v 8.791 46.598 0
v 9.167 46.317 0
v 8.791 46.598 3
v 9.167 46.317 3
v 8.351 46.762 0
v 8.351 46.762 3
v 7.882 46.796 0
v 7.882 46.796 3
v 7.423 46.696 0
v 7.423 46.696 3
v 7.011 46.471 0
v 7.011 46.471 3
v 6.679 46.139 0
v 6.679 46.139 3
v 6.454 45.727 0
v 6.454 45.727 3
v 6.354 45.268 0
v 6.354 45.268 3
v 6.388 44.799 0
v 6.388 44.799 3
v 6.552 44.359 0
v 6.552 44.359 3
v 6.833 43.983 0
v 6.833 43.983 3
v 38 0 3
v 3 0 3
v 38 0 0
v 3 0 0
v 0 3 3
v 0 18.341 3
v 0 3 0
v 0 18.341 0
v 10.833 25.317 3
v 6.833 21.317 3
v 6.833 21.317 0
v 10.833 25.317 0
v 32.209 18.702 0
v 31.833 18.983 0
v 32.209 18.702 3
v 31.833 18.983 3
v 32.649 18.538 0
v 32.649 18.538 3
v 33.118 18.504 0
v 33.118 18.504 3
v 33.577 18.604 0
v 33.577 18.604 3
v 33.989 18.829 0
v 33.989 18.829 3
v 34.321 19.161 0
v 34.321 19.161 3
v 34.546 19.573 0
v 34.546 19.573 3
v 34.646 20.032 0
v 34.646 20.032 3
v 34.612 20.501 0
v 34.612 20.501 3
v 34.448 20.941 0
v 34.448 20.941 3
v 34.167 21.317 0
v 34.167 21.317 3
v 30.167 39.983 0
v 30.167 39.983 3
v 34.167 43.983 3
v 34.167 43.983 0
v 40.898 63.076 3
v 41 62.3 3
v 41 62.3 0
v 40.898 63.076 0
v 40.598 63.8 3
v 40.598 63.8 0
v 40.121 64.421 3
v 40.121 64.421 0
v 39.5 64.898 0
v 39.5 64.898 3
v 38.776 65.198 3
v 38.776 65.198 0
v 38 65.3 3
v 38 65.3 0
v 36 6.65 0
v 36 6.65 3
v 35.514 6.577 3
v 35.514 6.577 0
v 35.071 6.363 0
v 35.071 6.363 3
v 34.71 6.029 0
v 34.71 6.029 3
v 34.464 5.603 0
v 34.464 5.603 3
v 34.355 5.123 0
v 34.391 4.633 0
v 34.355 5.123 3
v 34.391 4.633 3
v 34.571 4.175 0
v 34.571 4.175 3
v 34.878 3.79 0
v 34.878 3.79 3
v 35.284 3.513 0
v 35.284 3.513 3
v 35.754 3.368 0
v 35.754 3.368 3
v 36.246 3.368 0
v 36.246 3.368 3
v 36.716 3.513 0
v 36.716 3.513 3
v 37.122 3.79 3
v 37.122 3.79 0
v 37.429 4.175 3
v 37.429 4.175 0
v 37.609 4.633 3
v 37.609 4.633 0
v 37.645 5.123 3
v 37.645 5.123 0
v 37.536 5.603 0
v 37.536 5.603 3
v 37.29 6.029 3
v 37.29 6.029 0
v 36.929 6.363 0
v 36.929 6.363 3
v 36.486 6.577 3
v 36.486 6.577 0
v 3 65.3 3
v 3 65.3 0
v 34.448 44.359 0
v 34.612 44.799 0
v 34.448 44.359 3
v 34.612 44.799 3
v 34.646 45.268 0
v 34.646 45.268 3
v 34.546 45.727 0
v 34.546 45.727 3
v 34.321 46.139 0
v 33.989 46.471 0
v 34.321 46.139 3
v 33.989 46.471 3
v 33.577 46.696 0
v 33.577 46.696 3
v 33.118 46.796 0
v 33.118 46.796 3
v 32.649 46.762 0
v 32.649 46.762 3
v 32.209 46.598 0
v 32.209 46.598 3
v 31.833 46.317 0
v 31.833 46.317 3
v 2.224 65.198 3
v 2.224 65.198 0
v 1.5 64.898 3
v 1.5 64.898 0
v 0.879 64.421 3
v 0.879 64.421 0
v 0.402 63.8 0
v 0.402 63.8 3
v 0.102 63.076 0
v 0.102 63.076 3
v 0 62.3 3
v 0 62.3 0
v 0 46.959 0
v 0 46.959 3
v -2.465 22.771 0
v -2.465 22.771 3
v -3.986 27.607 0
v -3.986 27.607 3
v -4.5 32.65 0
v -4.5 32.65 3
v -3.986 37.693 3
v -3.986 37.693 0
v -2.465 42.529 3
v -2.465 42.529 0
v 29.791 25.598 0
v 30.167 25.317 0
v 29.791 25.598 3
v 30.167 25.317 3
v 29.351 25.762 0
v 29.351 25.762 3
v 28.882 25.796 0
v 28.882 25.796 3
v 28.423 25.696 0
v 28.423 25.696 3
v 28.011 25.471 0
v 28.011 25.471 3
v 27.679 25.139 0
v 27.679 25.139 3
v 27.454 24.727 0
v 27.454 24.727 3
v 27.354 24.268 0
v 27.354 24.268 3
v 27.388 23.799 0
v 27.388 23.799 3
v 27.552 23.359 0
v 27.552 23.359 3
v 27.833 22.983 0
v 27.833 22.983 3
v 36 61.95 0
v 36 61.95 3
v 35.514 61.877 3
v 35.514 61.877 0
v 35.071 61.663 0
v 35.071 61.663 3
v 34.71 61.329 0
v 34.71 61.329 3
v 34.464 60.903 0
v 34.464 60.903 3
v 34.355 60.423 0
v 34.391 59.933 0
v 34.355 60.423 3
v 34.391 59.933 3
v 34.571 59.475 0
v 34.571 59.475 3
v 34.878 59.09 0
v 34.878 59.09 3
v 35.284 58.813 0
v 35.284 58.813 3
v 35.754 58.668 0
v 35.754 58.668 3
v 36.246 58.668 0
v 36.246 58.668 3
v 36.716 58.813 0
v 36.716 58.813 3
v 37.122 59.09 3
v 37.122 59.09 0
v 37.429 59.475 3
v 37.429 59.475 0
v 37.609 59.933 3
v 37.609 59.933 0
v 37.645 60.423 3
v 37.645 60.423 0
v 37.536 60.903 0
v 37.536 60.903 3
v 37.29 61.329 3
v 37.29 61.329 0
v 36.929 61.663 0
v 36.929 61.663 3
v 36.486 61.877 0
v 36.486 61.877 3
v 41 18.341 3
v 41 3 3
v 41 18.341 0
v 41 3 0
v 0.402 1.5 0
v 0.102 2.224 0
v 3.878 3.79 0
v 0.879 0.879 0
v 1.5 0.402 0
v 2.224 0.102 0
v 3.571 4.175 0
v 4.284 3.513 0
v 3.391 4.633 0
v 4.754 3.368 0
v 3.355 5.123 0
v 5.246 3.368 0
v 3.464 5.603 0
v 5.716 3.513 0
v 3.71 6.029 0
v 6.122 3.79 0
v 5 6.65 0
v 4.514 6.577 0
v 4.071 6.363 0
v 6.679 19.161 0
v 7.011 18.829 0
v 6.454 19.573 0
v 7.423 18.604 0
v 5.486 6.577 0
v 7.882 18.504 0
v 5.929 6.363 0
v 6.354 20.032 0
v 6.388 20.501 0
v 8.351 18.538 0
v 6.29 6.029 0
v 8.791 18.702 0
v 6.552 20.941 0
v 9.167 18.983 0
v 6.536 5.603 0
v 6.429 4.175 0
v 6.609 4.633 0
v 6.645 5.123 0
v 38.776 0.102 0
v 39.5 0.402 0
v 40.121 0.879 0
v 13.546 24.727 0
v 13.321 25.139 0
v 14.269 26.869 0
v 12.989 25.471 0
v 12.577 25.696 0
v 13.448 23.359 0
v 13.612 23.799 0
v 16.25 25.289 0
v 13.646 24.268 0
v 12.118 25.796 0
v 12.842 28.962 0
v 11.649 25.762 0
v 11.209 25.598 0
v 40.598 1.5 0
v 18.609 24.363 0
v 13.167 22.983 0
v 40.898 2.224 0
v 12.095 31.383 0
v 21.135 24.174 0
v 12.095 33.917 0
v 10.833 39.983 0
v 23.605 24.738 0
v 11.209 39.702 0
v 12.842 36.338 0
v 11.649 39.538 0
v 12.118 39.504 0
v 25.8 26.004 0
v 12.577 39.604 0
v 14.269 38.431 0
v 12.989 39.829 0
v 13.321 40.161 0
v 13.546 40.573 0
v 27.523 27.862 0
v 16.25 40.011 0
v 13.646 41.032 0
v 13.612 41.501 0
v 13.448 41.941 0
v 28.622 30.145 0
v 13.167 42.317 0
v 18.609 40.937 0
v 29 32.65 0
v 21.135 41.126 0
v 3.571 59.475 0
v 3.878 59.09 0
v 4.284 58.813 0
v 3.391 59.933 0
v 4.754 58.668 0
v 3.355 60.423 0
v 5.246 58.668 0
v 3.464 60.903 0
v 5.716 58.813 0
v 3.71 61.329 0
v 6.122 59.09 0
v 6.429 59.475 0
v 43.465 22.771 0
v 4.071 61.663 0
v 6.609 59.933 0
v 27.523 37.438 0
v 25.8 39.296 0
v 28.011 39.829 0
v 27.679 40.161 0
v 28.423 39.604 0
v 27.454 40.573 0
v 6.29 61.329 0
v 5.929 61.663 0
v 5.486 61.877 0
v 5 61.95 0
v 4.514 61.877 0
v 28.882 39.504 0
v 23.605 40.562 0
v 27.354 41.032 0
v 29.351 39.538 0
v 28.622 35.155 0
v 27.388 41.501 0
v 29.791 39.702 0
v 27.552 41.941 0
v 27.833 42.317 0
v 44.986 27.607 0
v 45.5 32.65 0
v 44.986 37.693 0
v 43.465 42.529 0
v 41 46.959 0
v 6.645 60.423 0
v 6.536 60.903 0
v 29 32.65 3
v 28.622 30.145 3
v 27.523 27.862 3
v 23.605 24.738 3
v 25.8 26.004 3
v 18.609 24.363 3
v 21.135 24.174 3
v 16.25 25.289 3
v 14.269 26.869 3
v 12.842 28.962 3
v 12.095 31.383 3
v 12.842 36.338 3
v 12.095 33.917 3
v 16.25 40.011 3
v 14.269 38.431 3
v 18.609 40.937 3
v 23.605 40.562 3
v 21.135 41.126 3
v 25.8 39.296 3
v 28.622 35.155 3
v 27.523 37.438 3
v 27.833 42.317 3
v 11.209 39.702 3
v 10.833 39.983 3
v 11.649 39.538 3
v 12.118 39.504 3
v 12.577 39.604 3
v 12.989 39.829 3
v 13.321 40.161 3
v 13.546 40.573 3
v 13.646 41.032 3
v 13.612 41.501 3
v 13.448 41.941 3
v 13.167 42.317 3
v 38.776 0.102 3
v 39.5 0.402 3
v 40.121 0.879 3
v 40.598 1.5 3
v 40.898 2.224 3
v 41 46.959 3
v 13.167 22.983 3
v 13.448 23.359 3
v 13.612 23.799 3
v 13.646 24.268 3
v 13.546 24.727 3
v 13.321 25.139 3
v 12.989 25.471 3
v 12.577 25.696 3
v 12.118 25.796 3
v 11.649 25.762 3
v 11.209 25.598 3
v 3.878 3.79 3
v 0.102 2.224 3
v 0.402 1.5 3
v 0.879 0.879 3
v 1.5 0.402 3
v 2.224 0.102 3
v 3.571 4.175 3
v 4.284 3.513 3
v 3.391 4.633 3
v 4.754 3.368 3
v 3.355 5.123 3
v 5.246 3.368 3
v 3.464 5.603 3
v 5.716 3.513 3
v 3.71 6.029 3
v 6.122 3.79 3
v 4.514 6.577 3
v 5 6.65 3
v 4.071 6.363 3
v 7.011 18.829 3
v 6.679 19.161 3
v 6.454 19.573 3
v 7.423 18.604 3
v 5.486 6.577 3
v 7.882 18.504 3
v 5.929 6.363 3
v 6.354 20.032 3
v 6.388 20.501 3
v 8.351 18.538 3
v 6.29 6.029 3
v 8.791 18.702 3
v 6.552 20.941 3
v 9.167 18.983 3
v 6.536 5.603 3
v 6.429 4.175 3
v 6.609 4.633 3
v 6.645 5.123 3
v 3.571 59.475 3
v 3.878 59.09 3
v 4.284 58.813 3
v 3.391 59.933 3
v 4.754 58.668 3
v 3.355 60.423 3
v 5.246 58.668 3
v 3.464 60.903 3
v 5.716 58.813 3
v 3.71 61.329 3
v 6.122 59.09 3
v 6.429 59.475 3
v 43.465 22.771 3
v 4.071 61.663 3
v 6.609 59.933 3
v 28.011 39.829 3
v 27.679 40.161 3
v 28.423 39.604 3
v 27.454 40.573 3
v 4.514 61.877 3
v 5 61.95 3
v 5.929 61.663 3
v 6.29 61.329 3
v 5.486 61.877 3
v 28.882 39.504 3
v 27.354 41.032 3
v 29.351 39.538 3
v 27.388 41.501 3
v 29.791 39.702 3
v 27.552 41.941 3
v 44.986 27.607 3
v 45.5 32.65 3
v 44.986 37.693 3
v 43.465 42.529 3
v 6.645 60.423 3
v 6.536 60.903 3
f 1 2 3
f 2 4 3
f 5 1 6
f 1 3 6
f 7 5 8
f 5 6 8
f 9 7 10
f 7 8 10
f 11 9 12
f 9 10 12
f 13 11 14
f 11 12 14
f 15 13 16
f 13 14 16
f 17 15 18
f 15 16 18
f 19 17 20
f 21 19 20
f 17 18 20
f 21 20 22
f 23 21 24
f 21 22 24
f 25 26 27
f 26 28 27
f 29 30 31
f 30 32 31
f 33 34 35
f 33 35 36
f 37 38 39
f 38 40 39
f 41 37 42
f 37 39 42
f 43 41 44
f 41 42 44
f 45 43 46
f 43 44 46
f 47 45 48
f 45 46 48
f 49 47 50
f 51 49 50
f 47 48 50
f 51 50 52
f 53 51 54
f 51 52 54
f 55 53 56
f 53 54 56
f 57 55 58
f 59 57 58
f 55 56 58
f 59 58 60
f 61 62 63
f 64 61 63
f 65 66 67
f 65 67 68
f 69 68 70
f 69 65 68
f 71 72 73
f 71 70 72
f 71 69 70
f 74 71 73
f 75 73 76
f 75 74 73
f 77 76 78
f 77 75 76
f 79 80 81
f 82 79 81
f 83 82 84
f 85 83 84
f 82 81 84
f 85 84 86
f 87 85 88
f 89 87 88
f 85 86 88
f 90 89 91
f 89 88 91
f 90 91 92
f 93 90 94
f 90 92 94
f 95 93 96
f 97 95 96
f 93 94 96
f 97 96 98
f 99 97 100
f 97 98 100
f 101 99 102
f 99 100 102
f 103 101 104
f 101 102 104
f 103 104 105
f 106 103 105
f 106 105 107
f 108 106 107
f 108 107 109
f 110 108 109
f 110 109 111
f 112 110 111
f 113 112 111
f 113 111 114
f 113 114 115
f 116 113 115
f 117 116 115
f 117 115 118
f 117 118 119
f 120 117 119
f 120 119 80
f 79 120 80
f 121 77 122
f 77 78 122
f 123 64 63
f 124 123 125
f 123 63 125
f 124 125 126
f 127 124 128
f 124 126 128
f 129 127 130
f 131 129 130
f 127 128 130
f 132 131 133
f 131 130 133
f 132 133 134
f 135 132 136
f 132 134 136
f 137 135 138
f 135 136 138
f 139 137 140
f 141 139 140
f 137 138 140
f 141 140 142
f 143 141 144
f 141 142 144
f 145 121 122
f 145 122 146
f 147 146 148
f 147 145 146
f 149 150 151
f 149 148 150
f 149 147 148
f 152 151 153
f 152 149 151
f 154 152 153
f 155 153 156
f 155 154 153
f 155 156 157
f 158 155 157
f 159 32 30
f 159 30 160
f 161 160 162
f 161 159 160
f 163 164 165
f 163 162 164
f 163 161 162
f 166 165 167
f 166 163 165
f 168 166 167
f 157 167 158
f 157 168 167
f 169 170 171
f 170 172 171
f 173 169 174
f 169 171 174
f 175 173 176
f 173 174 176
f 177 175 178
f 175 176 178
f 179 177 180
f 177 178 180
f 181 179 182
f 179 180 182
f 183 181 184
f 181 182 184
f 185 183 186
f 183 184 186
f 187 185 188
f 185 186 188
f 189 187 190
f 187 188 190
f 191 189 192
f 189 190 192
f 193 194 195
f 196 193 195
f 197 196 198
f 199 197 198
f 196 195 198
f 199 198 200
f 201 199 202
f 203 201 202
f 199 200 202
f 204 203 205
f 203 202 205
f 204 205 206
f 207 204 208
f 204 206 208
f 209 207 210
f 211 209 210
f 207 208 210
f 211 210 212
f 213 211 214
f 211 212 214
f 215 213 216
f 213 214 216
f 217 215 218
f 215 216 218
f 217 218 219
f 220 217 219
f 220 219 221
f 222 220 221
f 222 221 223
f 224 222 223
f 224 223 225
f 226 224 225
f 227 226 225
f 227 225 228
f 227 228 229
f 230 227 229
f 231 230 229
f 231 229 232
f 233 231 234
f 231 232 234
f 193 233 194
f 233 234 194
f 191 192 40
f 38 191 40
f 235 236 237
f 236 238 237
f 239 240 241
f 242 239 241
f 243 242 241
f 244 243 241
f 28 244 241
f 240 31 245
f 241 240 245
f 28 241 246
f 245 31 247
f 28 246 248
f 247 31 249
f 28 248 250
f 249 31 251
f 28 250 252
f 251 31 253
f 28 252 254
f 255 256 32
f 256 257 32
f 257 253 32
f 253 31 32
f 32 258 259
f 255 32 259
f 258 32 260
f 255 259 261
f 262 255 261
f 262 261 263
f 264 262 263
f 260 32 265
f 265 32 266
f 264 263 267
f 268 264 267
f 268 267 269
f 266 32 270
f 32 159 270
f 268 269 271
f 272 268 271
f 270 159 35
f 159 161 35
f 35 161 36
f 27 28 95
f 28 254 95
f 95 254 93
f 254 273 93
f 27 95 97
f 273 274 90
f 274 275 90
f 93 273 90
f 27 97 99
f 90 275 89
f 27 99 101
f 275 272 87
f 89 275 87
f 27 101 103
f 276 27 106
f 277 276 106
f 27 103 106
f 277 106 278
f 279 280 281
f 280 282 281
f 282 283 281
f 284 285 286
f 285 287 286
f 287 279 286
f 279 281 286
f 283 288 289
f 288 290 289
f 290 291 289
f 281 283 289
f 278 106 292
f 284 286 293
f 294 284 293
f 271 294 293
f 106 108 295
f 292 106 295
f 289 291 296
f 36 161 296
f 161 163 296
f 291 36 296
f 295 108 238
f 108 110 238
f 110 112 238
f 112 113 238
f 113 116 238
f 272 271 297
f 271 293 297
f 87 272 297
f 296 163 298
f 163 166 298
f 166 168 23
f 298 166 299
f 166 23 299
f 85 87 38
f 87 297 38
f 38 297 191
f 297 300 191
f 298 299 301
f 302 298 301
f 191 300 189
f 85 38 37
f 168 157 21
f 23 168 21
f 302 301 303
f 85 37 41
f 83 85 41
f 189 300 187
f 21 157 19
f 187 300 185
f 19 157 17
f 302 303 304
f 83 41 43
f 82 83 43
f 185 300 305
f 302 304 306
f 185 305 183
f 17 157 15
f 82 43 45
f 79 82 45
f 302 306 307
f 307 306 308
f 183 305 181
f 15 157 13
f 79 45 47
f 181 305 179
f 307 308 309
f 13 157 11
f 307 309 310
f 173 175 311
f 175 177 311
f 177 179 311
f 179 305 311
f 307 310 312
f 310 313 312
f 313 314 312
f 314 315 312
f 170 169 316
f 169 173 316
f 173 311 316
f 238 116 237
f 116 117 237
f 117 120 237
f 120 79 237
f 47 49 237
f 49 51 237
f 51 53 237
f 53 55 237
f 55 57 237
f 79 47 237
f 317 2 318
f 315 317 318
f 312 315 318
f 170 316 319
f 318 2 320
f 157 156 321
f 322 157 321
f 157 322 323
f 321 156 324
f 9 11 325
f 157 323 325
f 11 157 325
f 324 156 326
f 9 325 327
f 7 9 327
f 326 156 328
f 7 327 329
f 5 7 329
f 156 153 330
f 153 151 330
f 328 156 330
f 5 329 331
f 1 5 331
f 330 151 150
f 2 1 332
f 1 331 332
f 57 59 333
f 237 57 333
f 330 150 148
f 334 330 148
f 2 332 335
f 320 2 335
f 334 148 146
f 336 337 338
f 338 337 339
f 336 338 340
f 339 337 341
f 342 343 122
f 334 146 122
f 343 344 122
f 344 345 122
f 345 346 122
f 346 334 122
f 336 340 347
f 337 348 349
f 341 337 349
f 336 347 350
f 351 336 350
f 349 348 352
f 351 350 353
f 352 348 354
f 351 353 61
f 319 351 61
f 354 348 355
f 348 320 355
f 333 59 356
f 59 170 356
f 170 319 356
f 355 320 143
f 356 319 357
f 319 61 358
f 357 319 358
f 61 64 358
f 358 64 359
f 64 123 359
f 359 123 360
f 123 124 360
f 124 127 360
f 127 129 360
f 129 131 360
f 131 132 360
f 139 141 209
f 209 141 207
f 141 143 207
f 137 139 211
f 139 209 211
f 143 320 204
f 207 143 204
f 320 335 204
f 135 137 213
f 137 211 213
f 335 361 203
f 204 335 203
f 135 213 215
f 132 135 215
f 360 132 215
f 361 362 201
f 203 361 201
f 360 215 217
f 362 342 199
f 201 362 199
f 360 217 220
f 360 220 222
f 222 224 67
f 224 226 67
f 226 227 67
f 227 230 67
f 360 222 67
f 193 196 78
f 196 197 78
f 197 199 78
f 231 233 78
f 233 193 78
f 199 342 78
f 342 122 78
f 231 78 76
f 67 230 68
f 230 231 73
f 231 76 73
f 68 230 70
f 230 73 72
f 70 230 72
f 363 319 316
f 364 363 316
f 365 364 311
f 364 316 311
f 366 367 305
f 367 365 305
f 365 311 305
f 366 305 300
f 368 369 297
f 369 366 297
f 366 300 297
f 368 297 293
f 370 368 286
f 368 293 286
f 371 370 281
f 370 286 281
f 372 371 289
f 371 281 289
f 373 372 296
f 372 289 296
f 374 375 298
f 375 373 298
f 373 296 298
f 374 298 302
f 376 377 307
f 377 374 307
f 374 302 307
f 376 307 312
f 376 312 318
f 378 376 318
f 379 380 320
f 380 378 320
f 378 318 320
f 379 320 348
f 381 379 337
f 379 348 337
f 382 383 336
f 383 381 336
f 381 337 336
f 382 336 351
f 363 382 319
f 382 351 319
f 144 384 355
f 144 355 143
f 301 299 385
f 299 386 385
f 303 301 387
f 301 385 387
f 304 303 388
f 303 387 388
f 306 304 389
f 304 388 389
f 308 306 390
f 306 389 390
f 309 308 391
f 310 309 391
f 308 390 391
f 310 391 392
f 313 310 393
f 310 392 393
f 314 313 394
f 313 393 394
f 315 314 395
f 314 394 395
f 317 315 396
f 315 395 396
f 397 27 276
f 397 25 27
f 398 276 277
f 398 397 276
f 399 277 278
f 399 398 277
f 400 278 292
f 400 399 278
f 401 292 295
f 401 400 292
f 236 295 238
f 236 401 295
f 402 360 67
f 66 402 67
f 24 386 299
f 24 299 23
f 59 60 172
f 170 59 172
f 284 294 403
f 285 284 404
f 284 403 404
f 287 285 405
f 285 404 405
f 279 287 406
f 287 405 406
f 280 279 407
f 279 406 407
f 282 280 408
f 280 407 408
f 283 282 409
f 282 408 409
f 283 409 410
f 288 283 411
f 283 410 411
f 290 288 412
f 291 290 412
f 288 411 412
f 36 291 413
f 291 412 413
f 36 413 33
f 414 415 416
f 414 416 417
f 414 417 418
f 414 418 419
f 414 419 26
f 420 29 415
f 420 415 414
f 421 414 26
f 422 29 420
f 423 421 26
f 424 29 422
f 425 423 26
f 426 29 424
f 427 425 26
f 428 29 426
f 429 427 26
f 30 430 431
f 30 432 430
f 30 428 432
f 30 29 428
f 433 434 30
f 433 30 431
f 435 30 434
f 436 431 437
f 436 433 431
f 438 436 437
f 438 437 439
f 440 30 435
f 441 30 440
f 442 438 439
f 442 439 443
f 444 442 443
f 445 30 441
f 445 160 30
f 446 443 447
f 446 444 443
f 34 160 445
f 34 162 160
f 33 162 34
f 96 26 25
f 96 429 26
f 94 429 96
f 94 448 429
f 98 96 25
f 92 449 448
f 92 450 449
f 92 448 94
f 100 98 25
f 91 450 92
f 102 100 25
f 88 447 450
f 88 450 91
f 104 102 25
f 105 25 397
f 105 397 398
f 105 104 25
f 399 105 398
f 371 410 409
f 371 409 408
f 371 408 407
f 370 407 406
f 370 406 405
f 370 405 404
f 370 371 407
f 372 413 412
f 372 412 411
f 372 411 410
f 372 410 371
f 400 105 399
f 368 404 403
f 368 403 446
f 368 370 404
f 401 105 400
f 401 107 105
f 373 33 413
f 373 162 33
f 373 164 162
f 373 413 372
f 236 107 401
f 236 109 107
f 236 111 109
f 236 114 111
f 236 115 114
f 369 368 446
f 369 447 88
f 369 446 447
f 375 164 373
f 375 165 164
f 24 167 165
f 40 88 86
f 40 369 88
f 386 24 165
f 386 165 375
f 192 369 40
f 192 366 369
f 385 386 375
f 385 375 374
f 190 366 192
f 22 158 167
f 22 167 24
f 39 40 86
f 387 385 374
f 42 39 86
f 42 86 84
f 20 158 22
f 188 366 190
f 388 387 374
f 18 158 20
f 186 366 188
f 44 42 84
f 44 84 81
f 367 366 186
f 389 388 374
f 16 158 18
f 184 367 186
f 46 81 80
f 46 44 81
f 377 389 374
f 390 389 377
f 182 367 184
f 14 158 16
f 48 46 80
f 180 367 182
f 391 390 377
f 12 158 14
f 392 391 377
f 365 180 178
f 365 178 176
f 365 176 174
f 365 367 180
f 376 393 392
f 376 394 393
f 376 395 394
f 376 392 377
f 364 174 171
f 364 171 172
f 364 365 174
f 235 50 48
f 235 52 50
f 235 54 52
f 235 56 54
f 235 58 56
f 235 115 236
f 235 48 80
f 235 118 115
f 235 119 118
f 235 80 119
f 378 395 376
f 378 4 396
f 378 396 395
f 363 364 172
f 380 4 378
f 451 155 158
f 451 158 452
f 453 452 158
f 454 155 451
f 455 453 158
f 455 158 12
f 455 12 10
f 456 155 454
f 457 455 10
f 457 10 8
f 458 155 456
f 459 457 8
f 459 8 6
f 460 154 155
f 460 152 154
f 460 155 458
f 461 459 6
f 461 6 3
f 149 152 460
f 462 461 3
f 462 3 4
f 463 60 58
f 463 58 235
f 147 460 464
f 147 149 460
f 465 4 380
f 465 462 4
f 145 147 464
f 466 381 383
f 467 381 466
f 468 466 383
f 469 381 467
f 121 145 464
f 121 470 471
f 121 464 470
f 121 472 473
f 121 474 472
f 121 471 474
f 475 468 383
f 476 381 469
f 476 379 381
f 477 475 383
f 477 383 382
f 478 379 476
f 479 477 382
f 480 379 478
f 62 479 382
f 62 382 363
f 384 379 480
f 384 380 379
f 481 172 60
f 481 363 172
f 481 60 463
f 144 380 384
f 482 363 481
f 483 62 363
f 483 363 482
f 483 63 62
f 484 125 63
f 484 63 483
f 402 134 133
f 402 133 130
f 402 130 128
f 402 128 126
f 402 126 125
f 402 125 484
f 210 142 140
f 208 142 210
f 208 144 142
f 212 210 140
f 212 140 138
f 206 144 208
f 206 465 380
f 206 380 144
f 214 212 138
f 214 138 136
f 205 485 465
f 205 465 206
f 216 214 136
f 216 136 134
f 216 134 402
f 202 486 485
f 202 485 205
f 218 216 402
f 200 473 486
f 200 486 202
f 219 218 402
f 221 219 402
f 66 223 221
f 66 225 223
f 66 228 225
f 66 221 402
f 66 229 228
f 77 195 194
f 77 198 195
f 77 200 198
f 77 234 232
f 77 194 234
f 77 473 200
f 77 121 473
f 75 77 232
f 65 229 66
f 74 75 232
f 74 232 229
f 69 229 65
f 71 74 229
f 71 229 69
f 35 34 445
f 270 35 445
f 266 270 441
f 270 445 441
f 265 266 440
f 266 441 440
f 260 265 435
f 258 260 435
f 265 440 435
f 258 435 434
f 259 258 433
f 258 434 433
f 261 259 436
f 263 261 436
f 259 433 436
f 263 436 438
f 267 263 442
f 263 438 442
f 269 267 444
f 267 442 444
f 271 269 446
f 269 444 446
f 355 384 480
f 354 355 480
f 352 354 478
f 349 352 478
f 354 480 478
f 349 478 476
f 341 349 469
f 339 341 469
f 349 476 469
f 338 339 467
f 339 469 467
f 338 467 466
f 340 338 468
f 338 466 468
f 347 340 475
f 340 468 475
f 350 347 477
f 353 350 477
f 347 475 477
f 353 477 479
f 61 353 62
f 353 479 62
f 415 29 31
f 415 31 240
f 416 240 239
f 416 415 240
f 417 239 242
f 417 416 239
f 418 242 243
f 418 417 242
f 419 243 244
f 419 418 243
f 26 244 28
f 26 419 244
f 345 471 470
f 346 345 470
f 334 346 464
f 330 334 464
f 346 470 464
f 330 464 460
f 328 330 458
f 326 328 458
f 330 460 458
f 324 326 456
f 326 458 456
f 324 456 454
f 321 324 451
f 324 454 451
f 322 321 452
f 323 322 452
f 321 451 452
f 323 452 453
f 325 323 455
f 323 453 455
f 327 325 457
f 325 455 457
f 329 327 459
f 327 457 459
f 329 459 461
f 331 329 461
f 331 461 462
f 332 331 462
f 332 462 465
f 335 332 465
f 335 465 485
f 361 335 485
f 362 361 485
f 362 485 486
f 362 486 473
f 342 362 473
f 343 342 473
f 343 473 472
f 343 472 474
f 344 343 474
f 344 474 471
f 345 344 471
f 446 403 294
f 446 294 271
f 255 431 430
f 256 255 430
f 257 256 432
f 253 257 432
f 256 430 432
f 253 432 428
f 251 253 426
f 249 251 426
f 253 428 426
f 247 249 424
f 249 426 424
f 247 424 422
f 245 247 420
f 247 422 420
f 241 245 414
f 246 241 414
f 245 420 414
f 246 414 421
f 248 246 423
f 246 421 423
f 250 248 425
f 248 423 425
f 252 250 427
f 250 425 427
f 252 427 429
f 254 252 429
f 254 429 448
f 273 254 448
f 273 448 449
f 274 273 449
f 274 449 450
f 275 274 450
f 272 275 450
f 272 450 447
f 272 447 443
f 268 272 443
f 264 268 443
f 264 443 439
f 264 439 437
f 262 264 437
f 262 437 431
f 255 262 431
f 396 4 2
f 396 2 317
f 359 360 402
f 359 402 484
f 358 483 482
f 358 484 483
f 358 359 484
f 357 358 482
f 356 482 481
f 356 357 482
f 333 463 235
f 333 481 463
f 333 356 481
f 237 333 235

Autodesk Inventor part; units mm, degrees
ref_plane "YZ Plane" through (0, 0, 0) normal (1, 0, 0) x (0, 1, 0)
ref_plane "XZ Plane" through (0, 0, 0) normal (0, 1, 0) x (-1, 0, 0)
ref_plane "XY Plane" through (0, 0, 0) normal (0, 0, 1) x (1, 0, 0)
sketch "Sketch1" plane through (0, 0, 0) normal (0, 0, 1) x (1, 0, 0)
  line L0 (0, 0) -> (41, 0) construction
  line L1 (41, 0) -> (41, 65.3) construction
  line L2 (41, 65.3) -> (0, 65.3) construction
  circle A0 centre (20.5, 32.65) radius 8.5
  line L3 (0, 0) -> (41, 0)
  line L4 (41, 65.3) -> (0, 65.3)
  line L5 (20.5, 65.3) -> (20.5, 0) construction
  line L6 (0, 32.65) -> (41, 32.65) construction
  line L7 (0, 65.3) -> (0, 46.9591) construction
  line L8 (0, 18.3409) -> (0, 0) construction
  line L9 (0, 65.3) -> (0, 46.9591)
  line L10 (0, 18.3409) -> (0, 0)
  line L11 (41, 0) -> (41, 18.3409)
  line L12 (41, 46.9591) -> (41, 65.3)
  arc A1 (0, 46.9591) -> (0, 18.3409) centre (20.5, 32.65) ccw
  arc A2 (41, 18.3409) -> (41, 46.9591) centre (20.5, 32.65) ccw
  point P0 (5, 60.3)
  point P1 (36, 60.3)
  point P2 (5, 5)
  point P3 (36, 5)
  point P4 (12, 41.15)
  point P5 (8, 45.15)
  point P6 (29, 41.15)
  point P7 (33, 45.15)
  point P8 (29, 24.15)
  point P9 (12, 24.15)
  point P10 (8, 20.15)
  point P11 (33, 20.15)
  dimension "d3" = 17
  dimension "d5" = 5
  dimension "d6" = 5
  dimension "d7" = 5
  dimension "d10" = 12.5
  dimension "d11" = 25
  dimension "d12" = 25
  dimension "d13" = 17
  dimension "d14" = 17
  dimension "d15" = 8.5
  dimension "d16" = 24.15
  dimension "d17" = 20.15
  dimension "d18" = 32.65
  dimension "d20" = 41
  dimension "d22" = 65.3
  dimension "d23" = 5
  dimension "d25" = 41
  dimension "d26" = 5
  dimension "d27" = 16.5
extrude "Extrusion1" add sketch "Sketch1" along normal blind 3
sketch "Sketch2" plane through (0, 0, 0) normal (0, 0, 1) x (1, 0, 0)
  line L0 (0, 0) -> (41, 0) construction
  line L1 (41, 0) -> (41, 65.3) construction
  line L2 (41, 65.3) -> (0, 65.3) construction
  circle A0 centre (20.5, 32.65) radius 8.5
  line L3 (0, 0) -> (41, 0)
  line L4 (41, 65.3) -> (0, 65.3)
  line L5 (20.5, 65.3) -> (20.5, 0) construction
  line L6 (0, 32.65) -> (41, 32.65) construction
  line L7 (0, 65.3) -> (0, 46.9591) construction
  line L8 (0, 18.3409) -> (0, 0) construction
  line L9 (0, 65.3) -> (0, 46.9591)
  line L10 (0, 18.3409) -> (0, 0)
  line L11 (41, 0) -> (41, 18.3409)
  line L12 (41, 46.9591) -> (41, 65.3)
  arc A1 (0, 46.9591) -> (0, 18.3409) centre (20.5, 32.65) ccw
  arc A2 (41, 18.3409) -> (41, 46.9591) centre (20.5, 32.65) ccw
  point P0 (5, 60.3)
  point P1 (36, 60.3)
  point P2 (5, 5)
  point P3 (36, 5)
  point P4 (12, 41.15)
  point P5 (8, 45.15)
  point P6 (29, 41.15)
  point P7 (33, 45.15)
  point P8 (29, 24.15)
  point P9 (12, 24.15)
  point P10 (8, 20.15)
  point P11 (33, 20.15)
  dimension "d30" = 17
  dimension "d31" = 5
  dimension "d32" = 5
  dimension "d33" = 5
  dimension "d34" = 12.5
  dimension "d35" = 25
  dimension "d36" = 25
  dimension "d37" = 17
  dimension "d38" = 17
  dimension "d39" = 8.5
  dimension "d40" = 24.15
  dimension "d41" = 20.15
  dimension "d42" = 32.65
  dimension "d43" = 41
  dimension "d44" = 65.3
  dimension "d45" = 5
  dimension "d46" = 41
  dimension "d47" = 5
  dimension "d48" = 16.5
hole "Hole1" at (5, 60.3, 0) at (36, 60.3, 0) at (5, 5, 0) at (36, 5, 0) at (12, 41.15, 0) at (8, 45.15, 0) at (29, 41.15, 0) at (33, 45.15, 0) at (29, 24.15, 0) at (12, 24.15, 0) at (8, 20.15, 0) at (33, 20.15, 0) direction (0, 0, 1) diameter 3.3 end through all
sketch "Sketch3" plane through (0, 0, 3) normal (0, 0, 1) x (1, 0, 0)
  circle A0 centre (8, 45.15) radius 1.65 projected
  line L0 (9.1667, 46.3167) -> (13.1667, 42.3167)
  circle A1 centre (12, 41.15) radius 1.65 projected
  circle A2 centre (33, 20.15) radius 1.65 projected
  circle A3 centre (29, 24.15) radius 1.65 projected
  circle A4 centre (33, 20.15) radius 1.65 projected
  circle A5 centre (29, 24.15) radius 1.65 projected
  line L1 (10.8333, 39.9833) -> (6.8333, 43.9833)
  circle A6 centre (33, 45.15) radius 1.65 projected
  circle A7 centre (29, 41.15) radius 1.65 projected
  circle A8 centre (33, 45.15) radius 1.65 projected
  circle A9 centre (8, 20.15) radius 1.65 projected
  line L2 (6.8333, 21.3167) -> (10.8333, 25.3167)
  line L3 (13.1667, 22.9833) -> (9.1667, 18.9833)
  circle A10 centre (12, 24.15) radius 1.65 projected
  line L4 (27.8333, 42.3167) -> (31.8333, 46.3167)
  line L5 (30.1667, 39.9833) -> (34.1667, 43.9833)
  line L6 (27.8333, 22.9833) -> (31.8333, 18.9833)
  line L7 (34.1667, 21.3167) -> (30.1667, 25.3167)
  point P0 (0, 0)
extrude "Extrusion2" cut sketch "Sketch3" against normal blind 3 contours A0 L0 A1 L1 | A2 L6 A3 L7 | A6 L5 A7 L4 | A9 L2 A10 L3
fillet "Fillet1" radius 3 4 edges at (41, 65.3, 1.5) (0, 65.3, 1.5) (0, 0, 1.5) (41, 0, 1.5)
sketch "Sketch4" plane through (0, 0, 3) normal (0, 0, 1) x (1, 0, 0)
  line L0 (13.1667, 22.9833) -> (9.1667, 18.9833) projected
  arc A0 (6.8333, 21.3167) -> (9.1667, 18.9833) centre (8, 20.15) ccw projected
  line L1 (6.8333, 21.3167) -> (10.8333, 25.3167) projected
  arc A1 (13.1667, 22.9833) -> (10.8333, 25.3167) centre (12, 24.15) ccw projected
  line L2 (31.8333, 18.9833) -> (27.8333, 22.9833) projected
  arc A2 (30.1667, 25.3167) -> (27.8333, 22.9833) centre (29, 24.15) ccw projected
  line L3 (30.1667, 25.3167) -> (34.1667, 21.3167) projected
  arc A3 (31.8333, 18.9833) -> (34.1667, 21.3167) centre (33, 20.15) ccw projected
  line L4 (34.1667, 43.9833) -> (30.1667, 39.9833) projected
  arc A4 (27.8333, 42.3167) -> (30.1667, 39.9833) centre (29, 41.15) ccw projected
  line L5 (27.8333, 42.3167) -> (31.8333, 46.3167) projected
  arc A5 (34.1667, 43.9833) -> (31.8333, 46.3167) centre (33, 45.15) ccw projected
  circle A6 centre (5, 5) radius 1.65 projected
  circle A7 centre (5, 60.3) radius 1.65 projected
  circle A8 centre (36, 60.3) radius 1.65 projected
  circle A9 centre (36, 5) radius 1.65 projected
  line L6 (10.8333, 39.9833) -> (6.8333, 43.9833) projected
  arc A10 (9.1667, 46.3167) -> (6.8333, 43.9833) centre (8, 45.15) ccw projected
  line L7 (9.1667, 46.3167) -> (13.1667, 42.3167) projected
  arc A11 (10.8333, 39.9833) -> (13.1667, 42.3167) centre (12, 41.15) ccw projected
  circle A12 centre (20.5, 32.65) radius 8.5 projected
  arc A13 (38, 0) -> (41, 3) centre (38, 3) ccw projected
  line L8 (41, 3) -> (41, 18.3409) projected
  arc A14 (41, 18.3409) -> (41, 46.9591) centre (20.5, 32.65) ccw projected
  line L9 (41, 46.9591) -> (41, 62.3) projected
  arc A15 (41, 62.3) -> (38, 65.3) centre (38, 62.3) ccw projected
  line L10 (38, 65.3) -> (3, 65.3) projected
  arc A16 (3, 65.3) -> (0, 62.3) centre (3, 62.3) ccw projected
  line L11 (0, 62.3) -> (0, 46.9591) projected
  arc A17 (0, 46.9591) -> (0, 18.3409) centre (20.5, 32.65) ccw projected
  line L12 (0, 18.3409) -> (0, 3) projected
  arc A18 (0, 3) -> (3, 0) centre (3, 3) ccw projected
  line L13 (3, 0) -> (38, 0) projected
  point P0 (0, 0)
properties part number "TapaSuperior"
